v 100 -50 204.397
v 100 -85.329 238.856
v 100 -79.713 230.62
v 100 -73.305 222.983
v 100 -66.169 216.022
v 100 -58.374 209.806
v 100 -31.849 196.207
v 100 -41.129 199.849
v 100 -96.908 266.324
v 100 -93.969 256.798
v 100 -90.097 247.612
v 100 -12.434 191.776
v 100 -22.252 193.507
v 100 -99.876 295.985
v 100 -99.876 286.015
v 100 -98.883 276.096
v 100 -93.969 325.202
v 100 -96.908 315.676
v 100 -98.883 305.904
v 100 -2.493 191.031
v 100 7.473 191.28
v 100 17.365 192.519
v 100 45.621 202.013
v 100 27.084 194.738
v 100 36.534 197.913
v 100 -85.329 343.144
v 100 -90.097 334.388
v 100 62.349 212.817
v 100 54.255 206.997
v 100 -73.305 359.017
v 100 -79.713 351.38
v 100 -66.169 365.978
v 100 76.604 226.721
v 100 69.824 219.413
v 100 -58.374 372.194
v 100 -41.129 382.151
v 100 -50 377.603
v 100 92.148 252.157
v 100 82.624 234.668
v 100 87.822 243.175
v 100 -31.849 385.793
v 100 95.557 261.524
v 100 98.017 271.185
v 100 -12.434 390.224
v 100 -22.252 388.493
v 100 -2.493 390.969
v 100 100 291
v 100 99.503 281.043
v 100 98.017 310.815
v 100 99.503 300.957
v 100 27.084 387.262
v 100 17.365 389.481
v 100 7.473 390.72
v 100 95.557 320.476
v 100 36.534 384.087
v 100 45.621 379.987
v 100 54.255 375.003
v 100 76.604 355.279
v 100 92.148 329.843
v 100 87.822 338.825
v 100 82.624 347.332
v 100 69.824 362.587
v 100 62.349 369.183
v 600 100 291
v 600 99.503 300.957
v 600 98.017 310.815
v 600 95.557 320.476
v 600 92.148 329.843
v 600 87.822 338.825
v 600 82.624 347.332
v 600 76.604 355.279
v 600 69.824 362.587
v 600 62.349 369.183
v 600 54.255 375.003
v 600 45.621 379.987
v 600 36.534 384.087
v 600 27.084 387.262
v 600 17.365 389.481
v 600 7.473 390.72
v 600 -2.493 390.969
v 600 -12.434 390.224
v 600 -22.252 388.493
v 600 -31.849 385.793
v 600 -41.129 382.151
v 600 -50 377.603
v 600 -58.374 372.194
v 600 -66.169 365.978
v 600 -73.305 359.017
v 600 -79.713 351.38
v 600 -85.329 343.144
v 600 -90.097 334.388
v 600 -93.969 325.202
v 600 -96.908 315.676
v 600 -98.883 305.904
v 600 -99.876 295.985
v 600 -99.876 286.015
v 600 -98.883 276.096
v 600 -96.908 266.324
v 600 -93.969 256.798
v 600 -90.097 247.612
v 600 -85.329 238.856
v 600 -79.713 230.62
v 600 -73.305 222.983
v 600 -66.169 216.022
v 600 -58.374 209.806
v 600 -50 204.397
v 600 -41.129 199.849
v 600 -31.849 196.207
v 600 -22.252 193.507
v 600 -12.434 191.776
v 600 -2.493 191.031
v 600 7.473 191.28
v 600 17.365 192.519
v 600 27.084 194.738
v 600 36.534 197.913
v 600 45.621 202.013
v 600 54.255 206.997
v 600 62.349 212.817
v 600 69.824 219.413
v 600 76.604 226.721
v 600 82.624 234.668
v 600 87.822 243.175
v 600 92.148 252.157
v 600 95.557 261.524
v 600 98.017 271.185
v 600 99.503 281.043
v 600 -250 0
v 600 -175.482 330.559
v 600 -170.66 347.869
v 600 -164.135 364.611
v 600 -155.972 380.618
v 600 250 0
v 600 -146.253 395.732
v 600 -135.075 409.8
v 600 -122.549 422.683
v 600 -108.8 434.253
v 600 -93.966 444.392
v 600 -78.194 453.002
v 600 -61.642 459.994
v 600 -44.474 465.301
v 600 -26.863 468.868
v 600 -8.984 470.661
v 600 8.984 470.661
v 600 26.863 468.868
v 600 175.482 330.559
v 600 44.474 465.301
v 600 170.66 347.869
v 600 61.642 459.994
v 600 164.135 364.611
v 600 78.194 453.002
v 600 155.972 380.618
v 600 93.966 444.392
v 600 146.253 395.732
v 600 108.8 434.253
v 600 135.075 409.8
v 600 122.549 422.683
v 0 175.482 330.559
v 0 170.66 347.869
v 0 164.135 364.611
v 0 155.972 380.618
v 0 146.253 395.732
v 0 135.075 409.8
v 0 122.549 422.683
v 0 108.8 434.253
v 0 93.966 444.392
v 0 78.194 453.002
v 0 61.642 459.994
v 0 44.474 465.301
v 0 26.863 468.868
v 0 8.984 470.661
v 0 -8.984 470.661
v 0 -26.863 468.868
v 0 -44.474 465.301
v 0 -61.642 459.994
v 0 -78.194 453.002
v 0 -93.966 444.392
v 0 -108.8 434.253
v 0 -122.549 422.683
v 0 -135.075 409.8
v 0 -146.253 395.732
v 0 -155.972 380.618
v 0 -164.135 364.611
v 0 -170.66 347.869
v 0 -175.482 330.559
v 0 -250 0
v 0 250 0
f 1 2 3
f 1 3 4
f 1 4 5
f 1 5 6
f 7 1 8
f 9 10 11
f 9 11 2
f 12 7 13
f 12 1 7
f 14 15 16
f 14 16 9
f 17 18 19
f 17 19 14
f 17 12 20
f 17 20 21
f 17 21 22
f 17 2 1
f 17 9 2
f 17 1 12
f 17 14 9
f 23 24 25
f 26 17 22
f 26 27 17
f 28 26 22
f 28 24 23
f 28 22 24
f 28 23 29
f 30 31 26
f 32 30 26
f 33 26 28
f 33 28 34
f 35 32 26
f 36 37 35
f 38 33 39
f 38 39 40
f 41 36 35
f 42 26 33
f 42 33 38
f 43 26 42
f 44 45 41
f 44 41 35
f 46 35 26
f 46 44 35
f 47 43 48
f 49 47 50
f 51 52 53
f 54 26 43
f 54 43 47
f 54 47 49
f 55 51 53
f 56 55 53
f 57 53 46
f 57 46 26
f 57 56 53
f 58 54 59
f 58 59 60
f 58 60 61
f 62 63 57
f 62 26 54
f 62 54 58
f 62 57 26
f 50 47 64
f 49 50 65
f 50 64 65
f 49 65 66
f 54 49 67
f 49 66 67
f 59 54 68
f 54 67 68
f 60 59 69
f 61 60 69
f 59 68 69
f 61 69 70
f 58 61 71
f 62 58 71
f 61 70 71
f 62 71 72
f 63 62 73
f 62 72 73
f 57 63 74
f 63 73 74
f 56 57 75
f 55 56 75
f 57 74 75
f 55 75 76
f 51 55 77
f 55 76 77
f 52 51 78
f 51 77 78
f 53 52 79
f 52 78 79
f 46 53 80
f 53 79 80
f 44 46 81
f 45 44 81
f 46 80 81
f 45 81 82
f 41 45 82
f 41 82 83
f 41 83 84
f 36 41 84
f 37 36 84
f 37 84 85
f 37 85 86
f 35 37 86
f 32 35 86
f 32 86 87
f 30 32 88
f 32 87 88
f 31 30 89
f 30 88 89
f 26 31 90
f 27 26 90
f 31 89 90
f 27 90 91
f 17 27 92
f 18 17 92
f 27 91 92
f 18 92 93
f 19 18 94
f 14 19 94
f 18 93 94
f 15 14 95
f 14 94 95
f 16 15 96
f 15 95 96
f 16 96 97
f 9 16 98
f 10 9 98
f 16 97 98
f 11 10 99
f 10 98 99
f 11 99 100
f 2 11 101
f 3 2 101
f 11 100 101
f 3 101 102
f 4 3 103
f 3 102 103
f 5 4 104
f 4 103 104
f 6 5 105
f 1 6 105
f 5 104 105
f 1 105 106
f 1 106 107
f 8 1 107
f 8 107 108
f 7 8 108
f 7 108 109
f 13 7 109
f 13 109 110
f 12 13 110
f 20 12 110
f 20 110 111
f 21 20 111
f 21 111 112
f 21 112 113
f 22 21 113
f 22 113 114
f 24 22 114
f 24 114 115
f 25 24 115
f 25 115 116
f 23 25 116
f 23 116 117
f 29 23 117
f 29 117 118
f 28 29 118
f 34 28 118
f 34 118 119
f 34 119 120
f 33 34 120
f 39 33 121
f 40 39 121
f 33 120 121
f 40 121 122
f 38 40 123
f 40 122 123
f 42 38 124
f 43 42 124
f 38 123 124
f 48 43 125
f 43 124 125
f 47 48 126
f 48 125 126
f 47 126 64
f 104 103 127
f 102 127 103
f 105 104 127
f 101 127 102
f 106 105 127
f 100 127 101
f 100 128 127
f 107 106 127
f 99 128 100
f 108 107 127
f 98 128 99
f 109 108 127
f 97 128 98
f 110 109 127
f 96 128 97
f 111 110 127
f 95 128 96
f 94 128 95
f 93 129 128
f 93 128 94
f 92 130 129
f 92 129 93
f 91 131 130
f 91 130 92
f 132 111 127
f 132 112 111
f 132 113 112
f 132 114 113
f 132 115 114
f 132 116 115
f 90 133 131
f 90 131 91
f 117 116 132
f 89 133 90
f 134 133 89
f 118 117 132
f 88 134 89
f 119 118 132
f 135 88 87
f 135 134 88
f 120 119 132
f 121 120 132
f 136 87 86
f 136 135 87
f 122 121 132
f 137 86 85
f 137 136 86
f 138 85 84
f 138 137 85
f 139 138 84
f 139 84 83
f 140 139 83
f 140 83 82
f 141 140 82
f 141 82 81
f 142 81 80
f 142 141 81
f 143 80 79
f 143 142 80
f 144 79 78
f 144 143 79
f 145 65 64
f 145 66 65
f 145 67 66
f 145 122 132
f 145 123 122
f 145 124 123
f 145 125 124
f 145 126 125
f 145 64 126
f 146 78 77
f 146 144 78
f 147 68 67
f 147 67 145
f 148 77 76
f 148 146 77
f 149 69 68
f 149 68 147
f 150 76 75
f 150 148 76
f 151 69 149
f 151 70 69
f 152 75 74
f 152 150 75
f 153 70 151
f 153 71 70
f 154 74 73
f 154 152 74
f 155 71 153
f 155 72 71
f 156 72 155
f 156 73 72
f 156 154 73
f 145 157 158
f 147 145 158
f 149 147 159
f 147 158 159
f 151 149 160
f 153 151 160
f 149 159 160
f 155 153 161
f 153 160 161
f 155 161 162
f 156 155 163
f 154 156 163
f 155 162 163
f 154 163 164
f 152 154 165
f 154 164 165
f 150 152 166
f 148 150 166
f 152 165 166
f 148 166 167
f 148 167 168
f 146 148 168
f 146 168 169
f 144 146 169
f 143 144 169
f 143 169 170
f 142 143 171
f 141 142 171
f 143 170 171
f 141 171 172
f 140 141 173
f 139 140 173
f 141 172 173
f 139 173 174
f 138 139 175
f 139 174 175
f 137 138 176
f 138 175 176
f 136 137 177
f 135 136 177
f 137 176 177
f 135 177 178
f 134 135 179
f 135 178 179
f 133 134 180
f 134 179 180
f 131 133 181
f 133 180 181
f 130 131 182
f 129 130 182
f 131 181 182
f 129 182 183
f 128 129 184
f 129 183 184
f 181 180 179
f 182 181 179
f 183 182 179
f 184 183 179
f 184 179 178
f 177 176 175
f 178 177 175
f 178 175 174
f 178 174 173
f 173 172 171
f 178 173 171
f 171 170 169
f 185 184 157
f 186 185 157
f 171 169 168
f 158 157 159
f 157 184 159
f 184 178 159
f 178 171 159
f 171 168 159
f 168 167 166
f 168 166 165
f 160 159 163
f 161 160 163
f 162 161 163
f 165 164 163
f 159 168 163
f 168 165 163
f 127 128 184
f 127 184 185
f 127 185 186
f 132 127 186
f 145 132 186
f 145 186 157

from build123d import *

# Parameters (mm, degrees)
F1_DEPTH = 600
F2_R     = 100
F3_DEPTH = 500


with BuildPart() as f1:
    # F0 (on Right) → F1 (new body)
    with BuildSketch(Plane.YZ):
        with BuildLine():
            Line((250, 0), (175.481897, 330.558985))
            ThreePointArc((175.481897, 330.558985), (0, 470.885545), (-175.481897, 330.558985))
            Line((-175.481897, 330.558985), (-250, 0))
            Line((-250, 0), (250, 0))
        make_face()
    extrude(amount=F1_DEPTH)

    # F2 (on face) → F3 (cut)
    with BuildSketch(Plane.YZ.offset(600)):
        with Locations((0, 291)):
            Circle(F2_R)
    extrude(amount=-F3_DEPTH, mode=Mode.SUBTRACT)


solid = f1.part
